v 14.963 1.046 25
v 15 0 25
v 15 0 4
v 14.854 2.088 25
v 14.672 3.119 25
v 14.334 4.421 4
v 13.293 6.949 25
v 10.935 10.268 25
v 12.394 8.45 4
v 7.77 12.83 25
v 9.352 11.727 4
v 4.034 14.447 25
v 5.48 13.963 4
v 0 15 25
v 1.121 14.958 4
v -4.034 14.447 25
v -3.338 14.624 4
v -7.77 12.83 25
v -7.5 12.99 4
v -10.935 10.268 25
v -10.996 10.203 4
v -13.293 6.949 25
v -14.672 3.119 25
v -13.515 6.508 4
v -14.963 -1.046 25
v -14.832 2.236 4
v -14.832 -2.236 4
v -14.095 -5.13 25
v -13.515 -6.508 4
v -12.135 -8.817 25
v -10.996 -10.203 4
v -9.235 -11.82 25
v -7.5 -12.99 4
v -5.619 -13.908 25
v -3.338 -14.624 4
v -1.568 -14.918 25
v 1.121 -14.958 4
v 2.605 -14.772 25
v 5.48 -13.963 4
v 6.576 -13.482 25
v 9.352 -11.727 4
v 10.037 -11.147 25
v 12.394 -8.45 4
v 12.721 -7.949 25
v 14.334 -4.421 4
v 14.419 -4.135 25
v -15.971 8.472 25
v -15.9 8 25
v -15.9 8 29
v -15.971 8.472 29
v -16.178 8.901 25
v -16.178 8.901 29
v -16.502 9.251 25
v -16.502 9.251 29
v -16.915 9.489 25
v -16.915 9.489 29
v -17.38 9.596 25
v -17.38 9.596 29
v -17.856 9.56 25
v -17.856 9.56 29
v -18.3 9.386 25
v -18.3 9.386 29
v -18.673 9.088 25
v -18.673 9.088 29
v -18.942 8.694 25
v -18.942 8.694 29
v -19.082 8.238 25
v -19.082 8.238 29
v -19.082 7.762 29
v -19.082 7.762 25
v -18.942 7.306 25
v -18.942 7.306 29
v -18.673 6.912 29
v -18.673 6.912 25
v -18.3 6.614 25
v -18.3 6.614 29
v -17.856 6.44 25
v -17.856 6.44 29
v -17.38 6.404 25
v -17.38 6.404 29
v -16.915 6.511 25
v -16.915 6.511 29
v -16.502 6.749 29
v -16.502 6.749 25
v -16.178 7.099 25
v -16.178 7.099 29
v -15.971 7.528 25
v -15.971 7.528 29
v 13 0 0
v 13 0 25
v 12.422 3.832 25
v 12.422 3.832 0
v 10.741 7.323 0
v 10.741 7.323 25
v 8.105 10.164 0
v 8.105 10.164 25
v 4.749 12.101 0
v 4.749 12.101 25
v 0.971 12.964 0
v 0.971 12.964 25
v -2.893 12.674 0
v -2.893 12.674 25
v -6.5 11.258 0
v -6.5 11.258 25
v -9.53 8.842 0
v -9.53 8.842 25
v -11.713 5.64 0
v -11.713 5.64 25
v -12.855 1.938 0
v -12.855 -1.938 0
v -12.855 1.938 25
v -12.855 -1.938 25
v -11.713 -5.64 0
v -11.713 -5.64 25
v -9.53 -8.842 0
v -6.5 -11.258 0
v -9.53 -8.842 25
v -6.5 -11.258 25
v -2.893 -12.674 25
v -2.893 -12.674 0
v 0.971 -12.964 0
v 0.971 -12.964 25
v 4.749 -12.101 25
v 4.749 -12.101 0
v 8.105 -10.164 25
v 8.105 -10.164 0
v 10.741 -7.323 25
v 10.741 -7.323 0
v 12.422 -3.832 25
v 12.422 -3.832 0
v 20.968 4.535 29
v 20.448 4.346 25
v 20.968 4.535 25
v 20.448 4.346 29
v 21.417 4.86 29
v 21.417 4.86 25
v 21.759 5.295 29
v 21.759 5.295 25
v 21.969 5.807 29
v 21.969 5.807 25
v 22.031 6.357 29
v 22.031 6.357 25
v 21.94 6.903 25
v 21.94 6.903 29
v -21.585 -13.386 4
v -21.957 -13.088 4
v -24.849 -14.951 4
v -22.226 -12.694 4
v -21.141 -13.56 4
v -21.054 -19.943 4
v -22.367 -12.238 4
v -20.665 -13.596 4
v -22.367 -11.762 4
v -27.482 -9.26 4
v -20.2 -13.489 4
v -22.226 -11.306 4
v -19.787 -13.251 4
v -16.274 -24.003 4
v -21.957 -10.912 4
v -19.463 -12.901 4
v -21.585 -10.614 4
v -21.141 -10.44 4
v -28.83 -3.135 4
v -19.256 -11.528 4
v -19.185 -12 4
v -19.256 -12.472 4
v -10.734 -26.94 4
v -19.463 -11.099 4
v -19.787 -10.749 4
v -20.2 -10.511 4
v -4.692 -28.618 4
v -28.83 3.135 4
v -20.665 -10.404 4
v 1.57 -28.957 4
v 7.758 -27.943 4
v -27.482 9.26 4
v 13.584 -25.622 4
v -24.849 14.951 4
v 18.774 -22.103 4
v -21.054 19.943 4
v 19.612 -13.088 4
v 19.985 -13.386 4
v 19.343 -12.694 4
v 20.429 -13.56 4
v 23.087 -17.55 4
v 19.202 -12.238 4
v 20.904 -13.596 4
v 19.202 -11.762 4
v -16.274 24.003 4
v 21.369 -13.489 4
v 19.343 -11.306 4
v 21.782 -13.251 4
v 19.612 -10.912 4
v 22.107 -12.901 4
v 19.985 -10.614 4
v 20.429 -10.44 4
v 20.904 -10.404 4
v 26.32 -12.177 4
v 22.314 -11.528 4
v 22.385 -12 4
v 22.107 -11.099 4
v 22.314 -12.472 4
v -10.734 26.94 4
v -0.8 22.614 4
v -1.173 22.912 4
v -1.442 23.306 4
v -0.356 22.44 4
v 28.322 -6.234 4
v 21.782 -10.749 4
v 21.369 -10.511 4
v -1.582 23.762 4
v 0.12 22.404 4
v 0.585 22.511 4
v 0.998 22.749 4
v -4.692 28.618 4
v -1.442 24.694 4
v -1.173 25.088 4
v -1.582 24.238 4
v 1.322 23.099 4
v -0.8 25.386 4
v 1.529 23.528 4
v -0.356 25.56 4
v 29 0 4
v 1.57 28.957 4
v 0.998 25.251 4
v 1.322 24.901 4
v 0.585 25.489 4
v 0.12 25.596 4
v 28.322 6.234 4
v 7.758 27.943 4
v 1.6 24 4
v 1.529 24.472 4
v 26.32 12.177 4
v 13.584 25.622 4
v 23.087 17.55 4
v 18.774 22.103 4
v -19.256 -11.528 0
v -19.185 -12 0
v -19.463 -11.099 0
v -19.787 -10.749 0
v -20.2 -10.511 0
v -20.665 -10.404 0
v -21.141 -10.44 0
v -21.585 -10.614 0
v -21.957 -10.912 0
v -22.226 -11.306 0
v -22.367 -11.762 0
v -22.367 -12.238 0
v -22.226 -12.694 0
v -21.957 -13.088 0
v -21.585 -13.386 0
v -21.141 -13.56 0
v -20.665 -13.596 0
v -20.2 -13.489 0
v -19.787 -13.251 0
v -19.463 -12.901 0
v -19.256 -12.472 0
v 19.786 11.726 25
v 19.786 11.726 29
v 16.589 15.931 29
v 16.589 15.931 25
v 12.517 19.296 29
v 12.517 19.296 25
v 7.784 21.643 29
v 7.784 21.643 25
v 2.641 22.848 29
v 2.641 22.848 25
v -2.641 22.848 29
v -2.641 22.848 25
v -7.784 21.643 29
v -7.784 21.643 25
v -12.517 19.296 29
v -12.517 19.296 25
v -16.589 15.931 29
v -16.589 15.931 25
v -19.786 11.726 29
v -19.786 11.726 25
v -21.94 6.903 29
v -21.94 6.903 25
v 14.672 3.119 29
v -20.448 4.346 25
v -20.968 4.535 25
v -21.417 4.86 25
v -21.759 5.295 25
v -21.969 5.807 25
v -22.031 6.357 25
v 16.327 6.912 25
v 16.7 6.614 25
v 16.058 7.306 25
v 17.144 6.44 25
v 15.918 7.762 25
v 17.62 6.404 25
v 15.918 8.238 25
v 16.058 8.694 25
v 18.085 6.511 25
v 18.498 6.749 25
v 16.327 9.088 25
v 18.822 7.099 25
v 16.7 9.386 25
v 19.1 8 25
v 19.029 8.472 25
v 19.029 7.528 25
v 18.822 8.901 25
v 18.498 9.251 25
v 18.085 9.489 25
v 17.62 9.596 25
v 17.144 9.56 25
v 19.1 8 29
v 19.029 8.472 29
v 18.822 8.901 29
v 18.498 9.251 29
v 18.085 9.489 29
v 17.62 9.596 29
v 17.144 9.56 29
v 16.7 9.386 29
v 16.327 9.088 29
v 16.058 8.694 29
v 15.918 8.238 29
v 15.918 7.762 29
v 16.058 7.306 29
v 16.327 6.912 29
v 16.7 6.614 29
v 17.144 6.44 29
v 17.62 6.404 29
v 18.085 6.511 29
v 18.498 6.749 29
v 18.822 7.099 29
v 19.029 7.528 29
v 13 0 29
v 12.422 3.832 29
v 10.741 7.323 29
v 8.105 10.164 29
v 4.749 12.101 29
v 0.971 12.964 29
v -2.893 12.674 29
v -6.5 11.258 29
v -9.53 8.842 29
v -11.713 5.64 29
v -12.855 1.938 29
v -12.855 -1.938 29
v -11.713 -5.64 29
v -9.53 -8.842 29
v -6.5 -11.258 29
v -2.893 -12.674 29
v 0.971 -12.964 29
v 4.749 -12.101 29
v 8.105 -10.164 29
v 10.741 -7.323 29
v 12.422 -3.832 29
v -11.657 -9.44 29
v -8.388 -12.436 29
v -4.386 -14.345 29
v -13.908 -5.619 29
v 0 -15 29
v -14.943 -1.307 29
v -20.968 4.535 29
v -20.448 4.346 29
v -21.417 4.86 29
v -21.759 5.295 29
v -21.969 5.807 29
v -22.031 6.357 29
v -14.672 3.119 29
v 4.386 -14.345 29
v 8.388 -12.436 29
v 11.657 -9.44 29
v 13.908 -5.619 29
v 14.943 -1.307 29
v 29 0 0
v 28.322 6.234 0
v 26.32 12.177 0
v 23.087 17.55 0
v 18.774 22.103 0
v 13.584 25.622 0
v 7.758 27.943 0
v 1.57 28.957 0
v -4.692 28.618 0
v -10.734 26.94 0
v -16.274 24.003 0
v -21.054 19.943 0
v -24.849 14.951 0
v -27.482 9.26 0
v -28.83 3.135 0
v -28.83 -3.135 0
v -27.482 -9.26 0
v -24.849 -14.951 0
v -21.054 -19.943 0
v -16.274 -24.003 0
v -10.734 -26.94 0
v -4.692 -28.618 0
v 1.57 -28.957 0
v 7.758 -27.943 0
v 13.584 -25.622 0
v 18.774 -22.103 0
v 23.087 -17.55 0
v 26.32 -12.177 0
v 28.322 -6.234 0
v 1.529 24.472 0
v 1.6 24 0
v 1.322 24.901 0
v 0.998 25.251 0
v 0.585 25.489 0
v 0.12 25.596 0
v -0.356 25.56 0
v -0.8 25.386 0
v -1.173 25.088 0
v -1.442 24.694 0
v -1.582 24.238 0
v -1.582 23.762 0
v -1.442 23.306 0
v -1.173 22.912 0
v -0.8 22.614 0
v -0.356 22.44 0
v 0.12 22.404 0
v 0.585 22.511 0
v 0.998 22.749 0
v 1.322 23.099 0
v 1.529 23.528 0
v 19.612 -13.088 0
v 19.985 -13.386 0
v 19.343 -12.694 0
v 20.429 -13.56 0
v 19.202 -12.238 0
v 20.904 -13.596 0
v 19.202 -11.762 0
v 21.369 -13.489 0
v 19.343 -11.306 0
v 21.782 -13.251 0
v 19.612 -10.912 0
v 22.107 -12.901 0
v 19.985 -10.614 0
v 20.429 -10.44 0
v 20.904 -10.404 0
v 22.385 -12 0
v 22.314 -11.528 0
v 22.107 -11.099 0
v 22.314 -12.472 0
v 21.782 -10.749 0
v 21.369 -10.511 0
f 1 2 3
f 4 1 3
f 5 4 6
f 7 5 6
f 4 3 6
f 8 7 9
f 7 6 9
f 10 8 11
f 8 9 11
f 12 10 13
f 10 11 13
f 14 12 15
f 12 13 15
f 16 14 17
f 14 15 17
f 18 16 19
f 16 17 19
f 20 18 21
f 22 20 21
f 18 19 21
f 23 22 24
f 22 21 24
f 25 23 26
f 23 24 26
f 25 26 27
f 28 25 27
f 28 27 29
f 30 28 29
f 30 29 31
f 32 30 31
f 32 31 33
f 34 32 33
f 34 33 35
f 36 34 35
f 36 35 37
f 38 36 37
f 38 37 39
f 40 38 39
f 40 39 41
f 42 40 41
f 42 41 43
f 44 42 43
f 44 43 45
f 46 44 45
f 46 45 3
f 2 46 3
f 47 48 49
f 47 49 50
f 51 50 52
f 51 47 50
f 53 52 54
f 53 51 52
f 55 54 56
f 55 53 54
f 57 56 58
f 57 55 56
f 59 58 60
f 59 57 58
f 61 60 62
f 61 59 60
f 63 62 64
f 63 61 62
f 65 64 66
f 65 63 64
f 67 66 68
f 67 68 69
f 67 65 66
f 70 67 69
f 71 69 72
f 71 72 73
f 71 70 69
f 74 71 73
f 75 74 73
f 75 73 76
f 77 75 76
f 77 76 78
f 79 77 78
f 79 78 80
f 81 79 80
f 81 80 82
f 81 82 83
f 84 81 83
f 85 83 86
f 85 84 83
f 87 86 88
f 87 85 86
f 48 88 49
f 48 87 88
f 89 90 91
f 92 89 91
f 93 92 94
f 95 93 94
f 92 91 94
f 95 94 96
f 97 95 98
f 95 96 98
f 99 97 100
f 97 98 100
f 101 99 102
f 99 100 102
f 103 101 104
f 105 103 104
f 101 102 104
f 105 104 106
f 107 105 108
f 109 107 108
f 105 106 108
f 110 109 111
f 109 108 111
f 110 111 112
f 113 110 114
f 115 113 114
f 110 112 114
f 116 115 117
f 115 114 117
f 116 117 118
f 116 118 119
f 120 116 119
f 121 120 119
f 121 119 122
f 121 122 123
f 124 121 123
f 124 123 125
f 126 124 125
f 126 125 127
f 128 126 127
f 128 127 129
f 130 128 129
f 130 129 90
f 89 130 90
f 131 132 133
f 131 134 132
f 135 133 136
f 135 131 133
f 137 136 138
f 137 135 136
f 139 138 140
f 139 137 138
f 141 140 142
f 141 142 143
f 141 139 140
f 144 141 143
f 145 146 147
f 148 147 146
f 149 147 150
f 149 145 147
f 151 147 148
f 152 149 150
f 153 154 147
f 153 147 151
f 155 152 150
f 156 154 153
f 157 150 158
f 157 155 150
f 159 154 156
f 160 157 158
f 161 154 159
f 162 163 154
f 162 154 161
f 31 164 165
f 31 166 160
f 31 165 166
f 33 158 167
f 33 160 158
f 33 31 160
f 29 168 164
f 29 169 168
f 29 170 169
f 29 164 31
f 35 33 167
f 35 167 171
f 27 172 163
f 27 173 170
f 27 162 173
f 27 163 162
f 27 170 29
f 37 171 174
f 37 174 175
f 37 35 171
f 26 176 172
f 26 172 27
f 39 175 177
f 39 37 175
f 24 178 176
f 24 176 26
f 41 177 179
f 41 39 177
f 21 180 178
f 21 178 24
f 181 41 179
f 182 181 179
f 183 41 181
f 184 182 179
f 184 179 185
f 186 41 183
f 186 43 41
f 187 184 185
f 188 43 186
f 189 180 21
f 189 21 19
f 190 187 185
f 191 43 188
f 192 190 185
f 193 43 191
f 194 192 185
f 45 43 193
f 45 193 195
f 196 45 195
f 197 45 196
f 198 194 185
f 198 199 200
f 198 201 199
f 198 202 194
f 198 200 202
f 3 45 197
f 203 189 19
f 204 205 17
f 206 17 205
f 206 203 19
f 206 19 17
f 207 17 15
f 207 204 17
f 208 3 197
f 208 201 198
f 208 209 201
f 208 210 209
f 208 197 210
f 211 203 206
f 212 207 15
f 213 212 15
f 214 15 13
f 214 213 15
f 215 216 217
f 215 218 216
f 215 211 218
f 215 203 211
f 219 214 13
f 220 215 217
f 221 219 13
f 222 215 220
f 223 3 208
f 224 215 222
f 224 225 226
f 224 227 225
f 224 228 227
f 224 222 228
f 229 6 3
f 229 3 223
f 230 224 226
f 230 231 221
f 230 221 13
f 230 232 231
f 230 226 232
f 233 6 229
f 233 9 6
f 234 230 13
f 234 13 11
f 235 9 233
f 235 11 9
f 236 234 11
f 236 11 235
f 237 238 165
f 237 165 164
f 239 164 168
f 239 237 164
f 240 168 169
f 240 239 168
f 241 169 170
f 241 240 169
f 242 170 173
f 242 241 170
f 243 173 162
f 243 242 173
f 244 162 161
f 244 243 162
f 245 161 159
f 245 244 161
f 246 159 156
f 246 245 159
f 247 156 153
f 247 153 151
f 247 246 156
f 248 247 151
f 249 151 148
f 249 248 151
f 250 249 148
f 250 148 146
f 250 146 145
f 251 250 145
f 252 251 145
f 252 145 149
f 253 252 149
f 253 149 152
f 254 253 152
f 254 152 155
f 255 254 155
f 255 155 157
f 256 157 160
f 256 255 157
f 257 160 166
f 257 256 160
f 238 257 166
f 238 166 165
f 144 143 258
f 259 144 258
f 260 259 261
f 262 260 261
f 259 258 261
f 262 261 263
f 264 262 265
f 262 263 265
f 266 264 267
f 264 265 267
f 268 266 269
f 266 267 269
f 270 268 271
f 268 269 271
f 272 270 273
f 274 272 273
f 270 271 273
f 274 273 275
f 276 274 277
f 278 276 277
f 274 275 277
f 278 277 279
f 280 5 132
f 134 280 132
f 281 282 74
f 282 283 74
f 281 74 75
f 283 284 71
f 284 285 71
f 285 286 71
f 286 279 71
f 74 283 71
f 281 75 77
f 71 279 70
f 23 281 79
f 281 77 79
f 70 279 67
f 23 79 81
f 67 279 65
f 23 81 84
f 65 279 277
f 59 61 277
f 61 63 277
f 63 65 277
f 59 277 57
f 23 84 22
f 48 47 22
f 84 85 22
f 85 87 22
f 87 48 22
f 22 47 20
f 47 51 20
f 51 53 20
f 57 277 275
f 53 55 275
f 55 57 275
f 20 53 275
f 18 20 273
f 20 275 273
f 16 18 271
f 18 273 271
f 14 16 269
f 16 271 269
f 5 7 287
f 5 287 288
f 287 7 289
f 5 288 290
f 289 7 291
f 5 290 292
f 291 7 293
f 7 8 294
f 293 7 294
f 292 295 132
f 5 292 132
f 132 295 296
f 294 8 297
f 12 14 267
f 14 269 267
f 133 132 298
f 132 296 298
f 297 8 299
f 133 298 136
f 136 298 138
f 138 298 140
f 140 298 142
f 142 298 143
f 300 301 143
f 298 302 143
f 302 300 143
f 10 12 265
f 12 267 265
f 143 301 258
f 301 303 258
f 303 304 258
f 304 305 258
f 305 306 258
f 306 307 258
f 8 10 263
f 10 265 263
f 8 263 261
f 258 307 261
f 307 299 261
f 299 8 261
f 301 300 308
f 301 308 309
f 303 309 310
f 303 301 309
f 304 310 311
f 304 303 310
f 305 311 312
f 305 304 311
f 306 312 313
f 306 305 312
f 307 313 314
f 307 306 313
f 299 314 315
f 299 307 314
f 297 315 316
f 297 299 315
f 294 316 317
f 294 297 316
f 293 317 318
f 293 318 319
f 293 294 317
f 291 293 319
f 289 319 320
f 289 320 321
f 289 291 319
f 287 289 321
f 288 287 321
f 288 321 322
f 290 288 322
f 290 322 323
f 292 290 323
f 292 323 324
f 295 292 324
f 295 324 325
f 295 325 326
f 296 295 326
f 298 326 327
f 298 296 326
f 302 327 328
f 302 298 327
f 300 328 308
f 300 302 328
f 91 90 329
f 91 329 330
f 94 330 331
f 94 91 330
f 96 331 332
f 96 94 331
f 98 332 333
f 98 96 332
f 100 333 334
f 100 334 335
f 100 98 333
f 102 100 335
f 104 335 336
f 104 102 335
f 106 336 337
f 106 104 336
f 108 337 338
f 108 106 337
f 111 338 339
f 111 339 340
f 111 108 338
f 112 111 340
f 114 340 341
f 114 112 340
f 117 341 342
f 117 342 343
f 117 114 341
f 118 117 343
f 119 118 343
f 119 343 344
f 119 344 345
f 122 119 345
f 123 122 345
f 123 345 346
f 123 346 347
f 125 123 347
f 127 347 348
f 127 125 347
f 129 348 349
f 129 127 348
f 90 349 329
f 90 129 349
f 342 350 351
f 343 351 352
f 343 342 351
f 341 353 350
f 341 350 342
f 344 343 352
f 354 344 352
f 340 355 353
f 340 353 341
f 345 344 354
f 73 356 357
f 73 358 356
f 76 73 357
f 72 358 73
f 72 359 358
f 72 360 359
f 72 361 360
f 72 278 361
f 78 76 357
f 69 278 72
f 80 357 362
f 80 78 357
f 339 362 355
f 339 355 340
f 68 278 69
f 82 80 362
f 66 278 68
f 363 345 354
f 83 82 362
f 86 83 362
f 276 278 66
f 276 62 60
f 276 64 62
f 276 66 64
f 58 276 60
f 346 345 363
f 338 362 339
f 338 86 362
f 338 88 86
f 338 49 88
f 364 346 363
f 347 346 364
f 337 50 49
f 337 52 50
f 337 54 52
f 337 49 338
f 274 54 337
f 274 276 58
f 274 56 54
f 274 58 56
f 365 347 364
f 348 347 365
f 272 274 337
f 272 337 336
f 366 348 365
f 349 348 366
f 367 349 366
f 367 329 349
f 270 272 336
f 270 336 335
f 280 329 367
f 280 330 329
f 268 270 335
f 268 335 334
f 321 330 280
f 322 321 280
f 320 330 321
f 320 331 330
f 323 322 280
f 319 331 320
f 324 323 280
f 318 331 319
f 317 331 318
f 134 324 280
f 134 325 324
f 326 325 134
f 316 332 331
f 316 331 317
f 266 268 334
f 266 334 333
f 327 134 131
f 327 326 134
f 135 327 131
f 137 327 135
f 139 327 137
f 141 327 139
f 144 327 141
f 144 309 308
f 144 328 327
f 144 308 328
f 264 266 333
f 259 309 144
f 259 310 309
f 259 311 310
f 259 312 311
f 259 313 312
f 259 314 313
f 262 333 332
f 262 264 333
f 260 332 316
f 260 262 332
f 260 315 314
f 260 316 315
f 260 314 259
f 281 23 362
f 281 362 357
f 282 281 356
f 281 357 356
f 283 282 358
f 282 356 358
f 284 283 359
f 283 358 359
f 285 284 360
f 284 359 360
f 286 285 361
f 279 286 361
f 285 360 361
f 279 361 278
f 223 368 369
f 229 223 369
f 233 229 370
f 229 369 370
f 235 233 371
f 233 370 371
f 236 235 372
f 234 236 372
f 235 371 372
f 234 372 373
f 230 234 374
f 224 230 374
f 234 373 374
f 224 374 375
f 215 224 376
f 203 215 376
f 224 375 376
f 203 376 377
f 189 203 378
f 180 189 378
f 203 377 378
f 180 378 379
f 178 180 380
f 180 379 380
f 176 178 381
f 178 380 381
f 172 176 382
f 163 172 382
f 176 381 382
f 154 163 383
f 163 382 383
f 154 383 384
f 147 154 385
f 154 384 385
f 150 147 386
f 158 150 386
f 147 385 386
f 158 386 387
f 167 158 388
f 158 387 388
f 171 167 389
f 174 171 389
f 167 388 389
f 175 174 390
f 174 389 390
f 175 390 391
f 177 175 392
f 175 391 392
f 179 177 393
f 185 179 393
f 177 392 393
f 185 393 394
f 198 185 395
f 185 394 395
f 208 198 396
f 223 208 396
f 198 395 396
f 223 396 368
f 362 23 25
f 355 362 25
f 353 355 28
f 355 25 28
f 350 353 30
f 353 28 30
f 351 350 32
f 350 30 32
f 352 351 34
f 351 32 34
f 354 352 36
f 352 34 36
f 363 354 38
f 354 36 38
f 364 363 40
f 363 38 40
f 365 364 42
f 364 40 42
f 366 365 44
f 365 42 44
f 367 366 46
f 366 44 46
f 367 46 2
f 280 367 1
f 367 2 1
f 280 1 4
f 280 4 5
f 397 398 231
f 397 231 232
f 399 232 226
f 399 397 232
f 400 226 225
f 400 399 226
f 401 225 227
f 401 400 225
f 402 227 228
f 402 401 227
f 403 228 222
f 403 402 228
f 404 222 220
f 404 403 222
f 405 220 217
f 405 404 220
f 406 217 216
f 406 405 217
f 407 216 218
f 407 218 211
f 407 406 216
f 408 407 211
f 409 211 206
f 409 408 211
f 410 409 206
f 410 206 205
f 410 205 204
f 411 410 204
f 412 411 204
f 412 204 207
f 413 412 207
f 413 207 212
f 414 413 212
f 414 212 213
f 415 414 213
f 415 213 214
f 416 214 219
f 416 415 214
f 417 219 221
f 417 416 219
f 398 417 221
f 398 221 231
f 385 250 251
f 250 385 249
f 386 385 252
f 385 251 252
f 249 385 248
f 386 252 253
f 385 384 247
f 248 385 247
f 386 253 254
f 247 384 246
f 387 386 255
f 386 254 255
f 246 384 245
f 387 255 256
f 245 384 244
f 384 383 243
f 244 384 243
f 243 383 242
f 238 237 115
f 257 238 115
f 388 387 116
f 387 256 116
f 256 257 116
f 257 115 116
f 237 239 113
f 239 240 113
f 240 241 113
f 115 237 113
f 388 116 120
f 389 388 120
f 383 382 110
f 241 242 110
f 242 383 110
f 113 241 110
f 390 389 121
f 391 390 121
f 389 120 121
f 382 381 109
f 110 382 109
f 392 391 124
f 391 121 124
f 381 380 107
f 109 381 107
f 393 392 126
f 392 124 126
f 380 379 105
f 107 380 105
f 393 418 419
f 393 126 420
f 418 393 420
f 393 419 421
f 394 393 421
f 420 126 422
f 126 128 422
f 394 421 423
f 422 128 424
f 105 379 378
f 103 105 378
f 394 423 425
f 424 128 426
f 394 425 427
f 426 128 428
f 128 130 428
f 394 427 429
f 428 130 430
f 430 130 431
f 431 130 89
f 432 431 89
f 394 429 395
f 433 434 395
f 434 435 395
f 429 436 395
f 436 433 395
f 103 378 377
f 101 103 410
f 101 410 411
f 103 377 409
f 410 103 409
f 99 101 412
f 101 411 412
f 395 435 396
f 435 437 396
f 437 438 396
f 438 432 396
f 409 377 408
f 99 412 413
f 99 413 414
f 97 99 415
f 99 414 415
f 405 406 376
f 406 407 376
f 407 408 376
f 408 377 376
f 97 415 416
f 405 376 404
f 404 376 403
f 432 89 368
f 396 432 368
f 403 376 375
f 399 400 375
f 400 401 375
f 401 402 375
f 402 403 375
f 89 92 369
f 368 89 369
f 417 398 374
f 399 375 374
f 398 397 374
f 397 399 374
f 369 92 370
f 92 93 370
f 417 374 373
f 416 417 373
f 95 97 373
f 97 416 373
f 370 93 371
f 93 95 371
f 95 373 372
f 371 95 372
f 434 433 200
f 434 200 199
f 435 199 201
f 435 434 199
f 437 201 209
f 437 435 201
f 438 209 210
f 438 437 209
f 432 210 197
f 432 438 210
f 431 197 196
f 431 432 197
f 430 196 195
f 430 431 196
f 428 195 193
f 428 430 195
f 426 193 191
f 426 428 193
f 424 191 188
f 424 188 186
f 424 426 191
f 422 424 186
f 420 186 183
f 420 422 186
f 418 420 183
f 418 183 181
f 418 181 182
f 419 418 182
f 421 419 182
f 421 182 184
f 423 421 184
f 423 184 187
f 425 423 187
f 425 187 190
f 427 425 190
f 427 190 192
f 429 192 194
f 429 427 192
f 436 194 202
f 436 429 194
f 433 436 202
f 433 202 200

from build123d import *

# Parameters (mm, degrees)
SKETCH_R      = 29
SKETCH_R_2    = 1.6
PAD_DEPTH     = 4
SKETCH001_R   = 15
PAD001_DEPTH  = 21
SKETCH002_R   = 13
POCKET_DEPTH  = 40
SKETCH003_R   = 13
SKETCH003_R_2 = 1.6
PAD002_DEPTH  = 4
FILLET_R      = 2


with BuildPart() as part:
    # Sketch → Pad (new body)
    with BuildSketch(Plane.XY):
        Circle(SKETCH_R)
        with Locations((0, 24)):
            Circle(SKETCH_R_2, mode=Mode.SUBTRACT)
        with Locations((20.78461, -12)):
            Circle(SKETCH_R_2, mode=Mode.SUBTRACT)
        with Locations((-20.78461, -12)):
            Circle(SKETCH_R_2, mode=Mode.SUBTRACT)
    extrude(amount=PAD_DEPTH)

    # Sketch001 (on Face6 of Pad) → Pad001 (join)
    with BuildSketch(Plane.XY.offset(4)):
        Circle(SKETCH001_R)
    extrude(amount=PAD001_DEPTH)

    # Sketch002 (on Face8 of Pad001) → Pocket (cut)
    with BuildSketch(Plane.XY.offset(25)):
        Circle(SKETCH002_R)
    extrude(amount=-POCKET_DEPTH, mode=Mode.SUBTRACT)

    # Sketch003 (on Face9 of Pocket) → Pad002 (join)
    with BuildSketch(Plane.XY.offset(25)):
        with BuildLine():
            ThreePointArc((-14.672214, 3.118675), (0, -15), (14.672214, 3.118675))
            Line((14.672214, 3.118675), (22.497395, 4.781969))
            ThreePointArc((22.497395, 4.781969), (0, 23), (-22.497395, 4.781969))
            Line((-14.672214, 3.118675), (-22.497395, 4.781969))
        make_face()
        Circle(SKETCH003_R, mode=Mode.SUBTRACT)
        with Locations((-17.5, 8)):
            Circle(SKETCH003_R_2, mode=Mode.SUBTRACT)
        with Locations((17.5, 8)):
            Circle(SKETCH003_R_2, mode=Mode.SUBTRACT)
    extrude(amount=PAD002_DEPTH)

    # Fillet
    fillet_edges = [part.edges().sort_by_distance(p)[0] for p in [
        (22.497395, 4.781969, 27),
        (-22.497395, 4.781969, 27),
    ]]
    fillet(fillet_edges, radius=FILLET_R)


solid = part.part
